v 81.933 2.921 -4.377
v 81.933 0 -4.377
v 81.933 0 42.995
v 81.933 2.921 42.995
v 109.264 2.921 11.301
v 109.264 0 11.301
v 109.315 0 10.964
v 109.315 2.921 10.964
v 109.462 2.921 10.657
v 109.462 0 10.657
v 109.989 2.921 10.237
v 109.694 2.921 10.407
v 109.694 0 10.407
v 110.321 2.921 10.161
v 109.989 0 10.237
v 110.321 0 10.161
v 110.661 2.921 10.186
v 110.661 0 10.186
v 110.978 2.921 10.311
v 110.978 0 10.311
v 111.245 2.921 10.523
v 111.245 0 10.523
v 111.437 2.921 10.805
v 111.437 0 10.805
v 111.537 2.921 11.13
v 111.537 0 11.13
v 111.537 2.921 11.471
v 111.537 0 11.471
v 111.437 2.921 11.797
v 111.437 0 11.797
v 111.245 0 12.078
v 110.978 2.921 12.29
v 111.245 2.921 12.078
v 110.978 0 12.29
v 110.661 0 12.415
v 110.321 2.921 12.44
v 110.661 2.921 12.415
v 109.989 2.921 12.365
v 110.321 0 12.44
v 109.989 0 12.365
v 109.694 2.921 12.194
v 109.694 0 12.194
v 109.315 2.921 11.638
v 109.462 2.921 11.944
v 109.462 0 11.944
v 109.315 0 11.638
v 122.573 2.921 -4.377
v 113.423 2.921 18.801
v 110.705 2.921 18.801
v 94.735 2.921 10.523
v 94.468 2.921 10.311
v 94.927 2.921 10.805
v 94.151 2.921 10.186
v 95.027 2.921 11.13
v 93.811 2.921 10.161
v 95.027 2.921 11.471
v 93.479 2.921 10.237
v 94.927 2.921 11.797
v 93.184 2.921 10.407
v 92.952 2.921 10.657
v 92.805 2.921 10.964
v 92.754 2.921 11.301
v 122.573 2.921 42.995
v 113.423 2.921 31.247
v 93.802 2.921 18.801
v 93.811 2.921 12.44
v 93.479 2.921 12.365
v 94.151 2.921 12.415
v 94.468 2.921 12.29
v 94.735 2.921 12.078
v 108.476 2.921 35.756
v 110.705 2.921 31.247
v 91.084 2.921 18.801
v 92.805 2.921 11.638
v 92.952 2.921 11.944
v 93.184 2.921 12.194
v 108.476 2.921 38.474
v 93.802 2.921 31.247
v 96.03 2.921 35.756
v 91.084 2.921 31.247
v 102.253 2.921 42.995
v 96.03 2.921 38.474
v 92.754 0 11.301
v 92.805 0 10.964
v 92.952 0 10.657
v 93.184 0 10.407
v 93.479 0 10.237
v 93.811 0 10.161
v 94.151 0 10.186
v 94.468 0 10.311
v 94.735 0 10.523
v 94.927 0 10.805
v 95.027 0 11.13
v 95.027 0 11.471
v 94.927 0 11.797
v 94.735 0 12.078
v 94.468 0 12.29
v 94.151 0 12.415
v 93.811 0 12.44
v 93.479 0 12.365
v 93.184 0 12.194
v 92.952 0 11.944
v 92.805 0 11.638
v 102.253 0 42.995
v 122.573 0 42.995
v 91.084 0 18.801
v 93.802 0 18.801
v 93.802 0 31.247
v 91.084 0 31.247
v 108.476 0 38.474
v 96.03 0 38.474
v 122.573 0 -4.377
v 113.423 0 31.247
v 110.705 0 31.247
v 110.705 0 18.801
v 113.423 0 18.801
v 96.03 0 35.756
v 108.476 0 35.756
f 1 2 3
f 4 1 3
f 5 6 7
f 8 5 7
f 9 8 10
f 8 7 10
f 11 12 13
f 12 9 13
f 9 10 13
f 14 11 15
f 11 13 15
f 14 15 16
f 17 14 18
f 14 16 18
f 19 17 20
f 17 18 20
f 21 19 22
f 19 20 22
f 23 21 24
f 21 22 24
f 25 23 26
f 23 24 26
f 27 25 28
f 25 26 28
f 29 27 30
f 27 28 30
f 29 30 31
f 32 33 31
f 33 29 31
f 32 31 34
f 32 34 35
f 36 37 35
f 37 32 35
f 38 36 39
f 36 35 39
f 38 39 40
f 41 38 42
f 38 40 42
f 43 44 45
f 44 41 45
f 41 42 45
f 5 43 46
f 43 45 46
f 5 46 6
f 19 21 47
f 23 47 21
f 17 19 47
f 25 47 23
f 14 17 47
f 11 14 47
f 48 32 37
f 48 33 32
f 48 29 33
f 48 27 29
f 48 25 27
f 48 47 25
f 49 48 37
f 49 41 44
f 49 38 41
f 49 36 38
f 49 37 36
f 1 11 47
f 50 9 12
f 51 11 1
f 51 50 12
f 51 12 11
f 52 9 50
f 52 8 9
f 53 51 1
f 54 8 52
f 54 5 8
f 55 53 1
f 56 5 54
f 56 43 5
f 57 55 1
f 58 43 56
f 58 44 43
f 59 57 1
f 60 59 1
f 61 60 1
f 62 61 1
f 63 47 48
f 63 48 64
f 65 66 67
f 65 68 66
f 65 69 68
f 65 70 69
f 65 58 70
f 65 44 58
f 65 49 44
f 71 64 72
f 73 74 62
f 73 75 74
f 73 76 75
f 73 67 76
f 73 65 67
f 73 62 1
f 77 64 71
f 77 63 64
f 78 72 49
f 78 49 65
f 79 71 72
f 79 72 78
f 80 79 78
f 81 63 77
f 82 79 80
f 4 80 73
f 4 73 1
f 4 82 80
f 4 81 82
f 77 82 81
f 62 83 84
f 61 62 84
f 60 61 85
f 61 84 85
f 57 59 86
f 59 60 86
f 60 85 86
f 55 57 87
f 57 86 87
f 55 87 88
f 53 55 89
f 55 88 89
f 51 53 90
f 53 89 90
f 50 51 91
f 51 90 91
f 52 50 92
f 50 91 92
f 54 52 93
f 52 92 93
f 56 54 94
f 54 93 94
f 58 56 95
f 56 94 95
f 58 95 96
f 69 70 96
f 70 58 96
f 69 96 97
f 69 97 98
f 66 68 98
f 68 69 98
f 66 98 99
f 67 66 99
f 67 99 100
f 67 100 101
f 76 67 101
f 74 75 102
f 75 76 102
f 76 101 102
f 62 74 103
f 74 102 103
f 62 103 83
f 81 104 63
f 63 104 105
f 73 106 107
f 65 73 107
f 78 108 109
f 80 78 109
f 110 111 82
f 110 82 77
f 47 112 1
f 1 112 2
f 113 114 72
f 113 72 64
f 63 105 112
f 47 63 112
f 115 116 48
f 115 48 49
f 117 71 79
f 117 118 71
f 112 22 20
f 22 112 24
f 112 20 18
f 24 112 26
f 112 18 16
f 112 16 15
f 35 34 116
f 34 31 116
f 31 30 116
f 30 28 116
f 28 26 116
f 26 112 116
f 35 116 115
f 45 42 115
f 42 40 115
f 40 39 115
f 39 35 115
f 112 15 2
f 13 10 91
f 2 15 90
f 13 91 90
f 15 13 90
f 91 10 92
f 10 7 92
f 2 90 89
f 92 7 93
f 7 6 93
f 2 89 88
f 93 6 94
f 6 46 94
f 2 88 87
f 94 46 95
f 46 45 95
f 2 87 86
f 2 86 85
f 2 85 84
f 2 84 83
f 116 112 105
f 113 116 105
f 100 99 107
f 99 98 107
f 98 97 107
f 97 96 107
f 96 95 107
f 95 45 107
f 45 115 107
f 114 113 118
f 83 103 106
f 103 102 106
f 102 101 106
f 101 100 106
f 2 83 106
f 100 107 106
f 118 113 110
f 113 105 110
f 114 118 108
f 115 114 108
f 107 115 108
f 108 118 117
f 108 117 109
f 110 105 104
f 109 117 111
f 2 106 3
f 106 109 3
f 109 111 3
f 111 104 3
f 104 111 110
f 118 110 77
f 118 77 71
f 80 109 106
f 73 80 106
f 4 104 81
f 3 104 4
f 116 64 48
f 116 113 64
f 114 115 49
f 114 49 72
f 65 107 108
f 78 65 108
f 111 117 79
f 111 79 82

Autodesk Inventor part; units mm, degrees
ref_plane "YZ Plane" through (0, 0, 0) normal (1, 0, 0) x (0, 1, 0)
ref_plane "XZ Plane" through (0, 0, 0) normal (0, 1, 0) x (-1, 0, 0)
ref_plane "XY Plane" through (0, 0, 0) normal (0, 0, 1) x (1, 0, 0)
sketch "Sketch1" plane through (0, 0, 0) normal (0, 1, 0) x (-1, 0, 0)
  arc A0 (-110.5448, 1.666) -> (-110.4284, 1.6651) centre (-110.4068, 11.3006) ccw construction
  arc A1 (-94.0784, 1.6651) -> (-94.0348, 1.6644) centre (-93.8968, 11.3006) ccw construction
  circle A2 centre (-110.4068, 11.3006) radius 1.143
  circle A3 centre (-93.8968, 11.3006) radius 1.143
  line L0 (-108.2859, -8.1857) -> (-96.2209, -8.1857) construction
  line L1 (-102.2534, 42.9953) -> (-122.5734, 42.9953)
  line L2 (-102.2534, 42.9953) -> (-81.9334, 42.9953)
  line L3 (-122.5734, 42.9953) -> (-122.5734, -4.3774)
  line L4 (-122.5734, -4.3774) -> (-81.9334, -4.3774)
  line L5 (-81.9334, -4.3774) -> (-81.9334, 42.9953)
  line L6 (-89.5534, -4.3774) -> (-114.9534, -4.3774) construction
  line L7 (-96.0304, 38.4741) -> (-108.4764, 38.4741)
  line L8 (-108.4764, 38.4741) -> (-108.4764, 35.7563)
  line L9 (-108.4764, 35.7563) -> (-96.0304, 35.7563)
  line L10 (-96.0304, 35.7563) -> (-96.0304, 38.4741)
  line L11 (-113.4226, 18.8009) -> (-110.7048, 18.8009)
  line L12 (-110.7048, 18.8009) -> (-110.7048, 31.2469)
  line L13 (-110.7048, 31.2469) -> (-113.4226, 31.2469)
  line L14 (-113.4226, 31.2469) -> (-113.4226, 18.8009)
  line L15 (-91.0842, 18.8009) -> (-93.802, 18.8009)
  line L16 (-93.802, 18.8009) -> (-93.802, 31.2469)
  line L17 (-93.802, 31.2469) -> (-91.0842, 31.2469)
  line L18 (-91.0842, 31.2469) -> (-91.0842, 18.8009)
  arc A4 (-93.8968, 10.028) -> (-93.9768, 12.5706) centre (-93.8968, 11.3006) ccw construction
  arc A5 (-110.3268, 12.5706) -> (-110.4068, 10.028) centre (-110.4068, 11.3006) ccw construction
  line L19 (-109.7718, 18.8653) -> (-94.5318, 18.8653) construction
  line L20 (-91.008, 15.4989) -> (-91.008, 18.6739) construction
  line L21 (-92.4431, 31.2469) -> (-92.4431, 18.8009) construction
  line L22 (-91.0842, 25.0239) -> (-93.802, 25.0239) construction
  line L23 (-112.0637, 18.8009) -> (-112.0637, 31.2469) construction
  line L24 (-110.7048, 25.0239) -> (-113.4226, 25.0239) construction
  line L25 (-96.0304, 37.1152) -> (-108.4764, 37.1152) construction
  line L26 (-102.2534, 35.7563) -> (-102.2534, 38.4741) construction
  point P0 (0, 0)
  point P1 (-102.2534, 36.3575)
  dimension "d0" = 2.286
  dimension "d1" = 2.286
  dimension "d19" = 3.175
  dimension "d23" = 6.223
  dimension "d24" = 1.3589
  dimension "d25" = 6.223
  dimension "d26" = 1.3589
  dimension "d27" = 6.223
  dimension "d28" = 1.3589
extrude "Extrusion1" add sketch "Sketch1" along normal blind 2.921
ref_plane "Work Plane1" through (102.2534, 0, 38.4741) normal (-1, 0, 0) x (0, 0, 1)
sketch "Sketch2" plane through (0, 2.921, 0) normal (0, 1, 0) x (1, 0, 0)
  point P0 (0, 0)
properties part number "arm4_11"
